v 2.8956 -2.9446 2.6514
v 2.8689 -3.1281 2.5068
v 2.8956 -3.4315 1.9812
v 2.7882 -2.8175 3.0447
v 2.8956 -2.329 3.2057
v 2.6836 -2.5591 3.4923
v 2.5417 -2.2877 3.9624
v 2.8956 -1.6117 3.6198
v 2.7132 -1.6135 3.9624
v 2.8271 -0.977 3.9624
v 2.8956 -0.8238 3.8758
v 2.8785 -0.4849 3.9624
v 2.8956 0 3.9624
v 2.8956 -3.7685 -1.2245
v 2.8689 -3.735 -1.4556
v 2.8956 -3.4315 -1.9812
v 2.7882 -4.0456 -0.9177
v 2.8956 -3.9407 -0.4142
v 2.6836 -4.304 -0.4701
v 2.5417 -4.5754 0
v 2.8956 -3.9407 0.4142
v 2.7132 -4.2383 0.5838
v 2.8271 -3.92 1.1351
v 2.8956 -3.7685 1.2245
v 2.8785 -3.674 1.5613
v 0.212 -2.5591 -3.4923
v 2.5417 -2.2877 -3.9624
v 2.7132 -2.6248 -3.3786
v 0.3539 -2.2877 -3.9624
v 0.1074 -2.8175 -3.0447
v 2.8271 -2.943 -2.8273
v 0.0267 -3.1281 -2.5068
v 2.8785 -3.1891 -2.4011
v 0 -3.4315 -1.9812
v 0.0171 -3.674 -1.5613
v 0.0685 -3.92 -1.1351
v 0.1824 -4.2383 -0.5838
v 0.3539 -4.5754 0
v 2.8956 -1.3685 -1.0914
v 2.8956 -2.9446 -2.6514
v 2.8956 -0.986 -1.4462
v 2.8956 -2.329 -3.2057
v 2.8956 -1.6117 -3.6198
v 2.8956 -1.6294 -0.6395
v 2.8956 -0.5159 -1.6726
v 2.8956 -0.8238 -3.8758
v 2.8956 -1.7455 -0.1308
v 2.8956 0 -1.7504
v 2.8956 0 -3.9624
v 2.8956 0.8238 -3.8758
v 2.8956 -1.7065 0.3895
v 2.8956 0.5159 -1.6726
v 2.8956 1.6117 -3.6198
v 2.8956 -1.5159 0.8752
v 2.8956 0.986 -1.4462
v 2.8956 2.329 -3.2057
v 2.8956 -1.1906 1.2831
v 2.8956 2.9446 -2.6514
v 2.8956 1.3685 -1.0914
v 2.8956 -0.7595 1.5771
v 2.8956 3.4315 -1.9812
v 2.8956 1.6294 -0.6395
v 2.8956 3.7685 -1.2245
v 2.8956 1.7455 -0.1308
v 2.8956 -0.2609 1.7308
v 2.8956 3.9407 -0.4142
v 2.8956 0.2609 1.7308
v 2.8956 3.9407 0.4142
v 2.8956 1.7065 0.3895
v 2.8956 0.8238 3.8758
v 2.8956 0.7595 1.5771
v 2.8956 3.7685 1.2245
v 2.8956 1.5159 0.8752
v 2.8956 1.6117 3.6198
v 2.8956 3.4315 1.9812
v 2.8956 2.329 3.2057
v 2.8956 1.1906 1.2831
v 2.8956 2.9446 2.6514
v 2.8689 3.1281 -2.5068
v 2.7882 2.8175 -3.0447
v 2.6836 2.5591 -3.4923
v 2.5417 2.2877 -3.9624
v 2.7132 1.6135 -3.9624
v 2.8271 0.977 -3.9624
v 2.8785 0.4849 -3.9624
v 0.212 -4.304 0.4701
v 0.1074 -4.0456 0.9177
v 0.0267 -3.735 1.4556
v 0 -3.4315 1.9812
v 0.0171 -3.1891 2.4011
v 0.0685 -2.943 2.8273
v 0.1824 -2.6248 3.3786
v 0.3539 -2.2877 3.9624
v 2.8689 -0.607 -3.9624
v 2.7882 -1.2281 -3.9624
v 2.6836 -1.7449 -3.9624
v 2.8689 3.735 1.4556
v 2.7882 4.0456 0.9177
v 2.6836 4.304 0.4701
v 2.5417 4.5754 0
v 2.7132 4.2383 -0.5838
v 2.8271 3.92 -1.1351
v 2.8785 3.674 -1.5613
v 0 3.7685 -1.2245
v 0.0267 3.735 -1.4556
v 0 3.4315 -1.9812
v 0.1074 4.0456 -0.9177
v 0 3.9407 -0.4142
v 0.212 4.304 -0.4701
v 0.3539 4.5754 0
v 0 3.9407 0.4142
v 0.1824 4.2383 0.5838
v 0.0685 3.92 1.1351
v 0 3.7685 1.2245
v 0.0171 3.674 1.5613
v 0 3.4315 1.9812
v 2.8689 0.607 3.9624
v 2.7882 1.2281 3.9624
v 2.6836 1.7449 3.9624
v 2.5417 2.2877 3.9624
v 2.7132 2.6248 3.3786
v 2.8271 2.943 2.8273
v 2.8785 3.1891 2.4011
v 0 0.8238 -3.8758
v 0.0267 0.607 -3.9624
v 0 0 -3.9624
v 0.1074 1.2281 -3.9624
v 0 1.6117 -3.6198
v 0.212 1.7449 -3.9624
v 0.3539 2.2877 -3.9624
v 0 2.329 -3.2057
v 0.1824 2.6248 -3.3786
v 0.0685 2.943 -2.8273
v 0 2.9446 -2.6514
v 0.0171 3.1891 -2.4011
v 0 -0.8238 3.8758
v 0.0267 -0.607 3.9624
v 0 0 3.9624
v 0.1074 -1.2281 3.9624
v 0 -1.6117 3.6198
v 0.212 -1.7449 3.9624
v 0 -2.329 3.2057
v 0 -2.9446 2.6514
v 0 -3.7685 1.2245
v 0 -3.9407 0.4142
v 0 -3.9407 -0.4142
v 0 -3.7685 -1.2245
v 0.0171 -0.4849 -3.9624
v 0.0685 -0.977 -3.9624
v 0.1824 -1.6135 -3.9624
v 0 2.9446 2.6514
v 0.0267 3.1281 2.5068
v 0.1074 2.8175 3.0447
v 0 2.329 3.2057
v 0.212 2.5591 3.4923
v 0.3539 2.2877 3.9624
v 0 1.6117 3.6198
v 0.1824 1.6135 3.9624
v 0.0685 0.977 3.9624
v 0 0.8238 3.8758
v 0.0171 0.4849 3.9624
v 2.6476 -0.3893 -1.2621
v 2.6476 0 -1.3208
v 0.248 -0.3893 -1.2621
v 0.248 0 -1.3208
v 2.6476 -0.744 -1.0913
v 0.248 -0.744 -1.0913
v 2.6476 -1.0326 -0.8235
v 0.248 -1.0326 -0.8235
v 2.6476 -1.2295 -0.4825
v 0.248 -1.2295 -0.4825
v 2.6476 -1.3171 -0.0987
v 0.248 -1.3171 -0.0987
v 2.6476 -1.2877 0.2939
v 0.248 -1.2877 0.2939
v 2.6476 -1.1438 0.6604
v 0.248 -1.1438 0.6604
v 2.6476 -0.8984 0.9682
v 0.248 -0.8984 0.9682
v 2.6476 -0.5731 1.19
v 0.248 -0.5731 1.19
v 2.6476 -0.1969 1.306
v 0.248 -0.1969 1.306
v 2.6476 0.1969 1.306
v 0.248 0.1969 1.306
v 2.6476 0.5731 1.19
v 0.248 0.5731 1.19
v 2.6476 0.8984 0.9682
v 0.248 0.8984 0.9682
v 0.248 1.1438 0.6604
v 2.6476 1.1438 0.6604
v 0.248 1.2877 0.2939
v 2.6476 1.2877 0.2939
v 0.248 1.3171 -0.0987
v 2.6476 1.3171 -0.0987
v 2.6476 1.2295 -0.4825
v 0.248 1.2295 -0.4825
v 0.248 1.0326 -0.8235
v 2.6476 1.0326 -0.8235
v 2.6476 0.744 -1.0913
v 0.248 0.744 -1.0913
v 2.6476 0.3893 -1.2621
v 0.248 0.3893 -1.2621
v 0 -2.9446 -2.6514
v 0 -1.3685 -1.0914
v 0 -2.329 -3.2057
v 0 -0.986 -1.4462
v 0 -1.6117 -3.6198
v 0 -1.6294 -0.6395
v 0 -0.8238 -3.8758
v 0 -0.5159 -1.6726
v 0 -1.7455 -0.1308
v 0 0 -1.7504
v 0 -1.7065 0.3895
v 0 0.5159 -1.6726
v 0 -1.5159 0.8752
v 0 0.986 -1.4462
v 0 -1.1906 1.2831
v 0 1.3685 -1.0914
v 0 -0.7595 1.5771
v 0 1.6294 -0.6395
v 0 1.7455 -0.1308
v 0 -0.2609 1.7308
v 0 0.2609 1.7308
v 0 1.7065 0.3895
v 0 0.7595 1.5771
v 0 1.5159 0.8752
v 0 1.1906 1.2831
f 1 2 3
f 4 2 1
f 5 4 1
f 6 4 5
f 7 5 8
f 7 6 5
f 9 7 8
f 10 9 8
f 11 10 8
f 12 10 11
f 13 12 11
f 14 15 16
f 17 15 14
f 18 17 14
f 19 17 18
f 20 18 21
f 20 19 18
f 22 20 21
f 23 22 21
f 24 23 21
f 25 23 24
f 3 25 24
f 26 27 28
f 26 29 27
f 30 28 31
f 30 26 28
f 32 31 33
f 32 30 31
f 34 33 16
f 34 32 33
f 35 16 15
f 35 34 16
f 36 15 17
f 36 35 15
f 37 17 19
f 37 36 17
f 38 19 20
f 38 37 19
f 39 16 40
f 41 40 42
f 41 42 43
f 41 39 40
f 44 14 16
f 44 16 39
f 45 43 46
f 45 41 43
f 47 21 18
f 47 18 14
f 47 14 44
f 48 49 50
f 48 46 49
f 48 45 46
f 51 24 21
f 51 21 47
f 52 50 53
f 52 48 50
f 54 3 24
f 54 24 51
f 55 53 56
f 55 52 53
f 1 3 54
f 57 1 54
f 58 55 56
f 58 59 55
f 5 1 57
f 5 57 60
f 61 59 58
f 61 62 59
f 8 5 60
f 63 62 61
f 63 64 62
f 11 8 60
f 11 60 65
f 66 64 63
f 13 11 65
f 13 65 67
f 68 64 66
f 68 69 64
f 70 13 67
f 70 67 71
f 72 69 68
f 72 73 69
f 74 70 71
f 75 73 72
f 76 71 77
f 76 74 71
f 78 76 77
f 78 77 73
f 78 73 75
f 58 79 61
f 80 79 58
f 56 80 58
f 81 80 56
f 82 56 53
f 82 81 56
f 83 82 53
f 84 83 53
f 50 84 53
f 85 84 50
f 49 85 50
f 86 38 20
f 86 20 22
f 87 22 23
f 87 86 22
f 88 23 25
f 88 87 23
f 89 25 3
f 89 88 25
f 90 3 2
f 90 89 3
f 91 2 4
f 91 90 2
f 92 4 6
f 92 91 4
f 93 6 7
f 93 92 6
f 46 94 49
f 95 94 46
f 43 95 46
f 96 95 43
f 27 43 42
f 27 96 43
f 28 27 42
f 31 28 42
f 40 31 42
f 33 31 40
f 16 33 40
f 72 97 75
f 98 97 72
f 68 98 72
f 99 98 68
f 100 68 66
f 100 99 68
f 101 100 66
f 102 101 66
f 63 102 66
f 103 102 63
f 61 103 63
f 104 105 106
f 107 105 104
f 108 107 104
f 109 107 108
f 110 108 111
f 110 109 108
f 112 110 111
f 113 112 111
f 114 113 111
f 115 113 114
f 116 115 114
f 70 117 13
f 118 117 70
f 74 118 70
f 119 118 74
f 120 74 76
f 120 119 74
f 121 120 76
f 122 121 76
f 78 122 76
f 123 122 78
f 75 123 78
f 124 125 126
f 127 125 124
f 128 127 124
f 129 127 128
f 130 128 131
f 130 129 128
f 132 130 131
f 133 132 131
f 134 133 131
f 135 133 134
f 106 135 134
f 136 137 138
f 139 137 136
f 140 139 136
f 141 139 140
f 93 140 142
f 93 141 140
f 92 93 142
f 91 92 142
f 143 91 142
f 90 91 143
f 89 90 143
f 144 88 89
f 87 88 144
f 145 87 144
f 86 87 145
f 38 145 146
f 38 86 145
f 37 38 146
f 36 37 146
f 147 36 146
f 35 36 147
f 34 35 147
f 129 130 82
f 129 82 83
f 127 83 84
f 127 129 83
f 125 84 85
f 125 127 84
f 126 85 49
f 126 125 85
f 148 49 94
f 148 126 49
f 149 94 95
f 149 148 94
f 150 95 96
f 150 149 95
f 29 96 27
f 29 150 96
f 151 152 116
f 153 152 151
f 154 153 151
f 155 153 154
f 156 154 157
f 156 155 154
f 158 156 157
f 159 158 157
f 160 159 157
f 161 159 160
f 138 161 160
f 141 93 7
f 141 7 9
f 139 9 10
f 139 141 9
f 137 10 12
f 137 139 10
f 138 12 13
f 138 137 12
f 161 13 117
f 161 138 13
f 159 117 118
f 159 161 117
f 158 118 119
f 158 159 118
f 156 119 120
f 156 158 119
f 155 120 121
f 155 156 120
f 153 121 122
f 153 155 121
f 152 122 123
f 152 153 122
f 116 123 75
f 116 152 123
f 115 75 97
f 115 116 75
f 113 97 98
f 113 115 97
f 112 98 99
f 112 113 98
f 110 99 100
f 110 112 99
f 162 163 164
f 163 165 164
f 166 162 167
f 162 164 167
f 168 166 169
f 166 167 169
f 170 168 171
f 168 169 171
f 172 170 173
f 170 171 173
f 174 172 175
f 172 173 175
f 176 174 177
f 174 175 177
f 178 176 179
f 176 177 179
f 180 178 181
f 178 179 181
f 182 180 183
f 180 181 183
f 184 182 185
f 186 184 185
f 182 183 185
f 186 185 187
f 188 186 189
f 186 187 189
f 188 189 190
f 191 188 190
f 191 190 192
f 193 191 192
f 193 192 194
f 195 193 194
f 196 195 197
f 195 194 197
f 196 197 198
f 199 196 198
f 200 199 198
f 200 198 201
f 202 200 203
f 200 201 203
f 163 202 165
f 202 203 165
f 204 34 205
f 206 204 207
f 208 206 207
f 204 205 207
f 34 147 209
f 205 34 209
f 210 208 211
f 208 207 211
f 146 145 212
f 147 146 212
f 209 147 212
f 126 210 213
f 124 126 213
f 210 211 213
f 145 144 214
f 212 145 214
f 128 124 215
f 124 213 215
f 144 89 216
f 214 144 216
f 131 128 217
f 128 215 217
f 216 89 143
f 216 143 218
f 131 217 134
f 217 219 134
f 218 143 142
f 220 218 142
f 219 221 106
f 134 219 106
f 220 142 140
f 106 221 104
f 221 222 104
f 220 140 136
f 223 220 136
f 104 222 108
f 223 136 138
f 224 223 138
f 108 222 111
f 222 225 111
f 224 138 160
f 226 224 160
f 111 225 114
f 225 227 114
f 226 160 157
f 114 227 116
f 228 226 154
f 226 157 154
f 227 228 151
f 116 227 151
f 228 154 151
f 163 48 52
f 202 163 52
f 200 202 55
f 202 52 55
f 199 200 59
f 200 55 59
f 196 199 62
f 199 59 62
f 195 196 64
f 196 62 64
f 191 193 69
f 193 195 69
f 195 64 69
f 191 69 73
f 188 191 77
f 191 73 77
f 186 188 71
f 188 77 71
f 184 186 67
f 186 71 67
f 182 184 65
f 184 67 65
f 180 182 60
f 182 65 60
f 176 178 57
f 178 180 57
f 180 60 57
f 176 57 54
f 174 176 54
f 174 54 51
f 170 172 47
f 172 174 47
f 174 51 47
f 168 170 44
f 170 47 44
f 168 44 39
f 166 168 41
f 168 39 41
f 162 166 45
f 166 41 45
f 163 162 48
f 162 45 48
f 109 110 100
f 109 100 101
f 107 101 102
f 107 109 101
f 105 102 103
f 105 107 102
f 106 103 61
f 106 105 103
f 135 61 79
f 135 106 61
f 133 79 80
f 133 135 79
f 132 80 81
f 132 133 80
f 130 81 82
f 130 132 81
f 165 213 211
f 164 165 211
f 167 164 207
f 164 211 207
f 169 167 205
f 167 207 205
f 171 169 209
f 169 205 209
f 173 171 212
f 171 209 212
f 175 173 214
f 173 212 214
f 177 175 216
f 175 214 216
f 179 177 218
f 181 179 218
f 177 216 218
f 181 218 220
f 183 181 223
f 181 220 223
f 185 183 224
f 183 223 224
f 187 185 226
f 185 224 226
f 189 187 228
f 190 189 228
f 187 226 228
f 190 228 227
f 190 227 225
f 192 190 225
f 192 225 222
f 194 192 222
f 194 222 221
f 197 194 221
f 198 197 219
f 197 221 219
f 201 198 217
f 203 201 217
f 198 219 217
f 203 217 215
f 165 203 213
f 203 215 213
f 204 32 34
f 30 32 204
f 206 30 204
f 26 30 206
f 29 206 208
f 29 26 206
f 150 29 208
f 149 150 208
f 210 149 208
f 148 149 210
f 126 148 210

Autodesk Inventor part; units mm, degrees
ref_plane "YZ Plane" through (0, 0, 0) normal (1, 0, 0) x (0, 1, 0)
ref_plane "XZ Plane" through (0, 0, 0) normal (0, 1, 0) x (-1, 0, 0)
sketch "Sketch1" plane through (0, 0, 0) normal (1, 0, 0) x (0, 1, 0)
  line L0 (-4.5754, 0) -> (-2.2877, 3.9624)
  line L1 (-2.2877, 3.9624) -> (2.2877, 3.9624)
  line L2 (2.2877, 3.9624) -> (4.5754, 0)
  line L3 (4.5754, 0) -> (2.2877, -3.9624)
  line L4 (2.2877, -3.9624) -> (-2.2877, -3.9624)
  line L5 (-2.2877, -3.9624) -> (-4.5754, 0)
  point P0 (0, 0)
  point P1 (0, 0)
  dimension "d0" = 9.1508
extrude "Body" add sketch "Sketch1" along normal blind 2.8956
sketch "Sketch2" plane through (0, 0, 0) normal (0, 0, 1) x (1, 0, 0)
  line L0 (0, 2.2877) -> (0, 4.5754) projected
  line L1 (0, 4.5754) -> (2.8956, 4.5754) projected
  line L2 (2.8956, 2.2877) -> (2.8956, 4.5754) projected
  line L3 (-0.5791, 0) -> (3.4747, 0) projected
  line L4 (0.3539, 4.5754) -> (0, 3.9624)
  line L5 (2.5417, 4.5754) -> (2.8956, 3.9624)
  dimension "d3" = 30
  dimension "d4" = 30
  dimension "d5" = 7.9248
  dimension "d6" = 7.9248
revolve "Chamfer1" cut sketch "Sketch2" angle 360 about axis through (-10, 0, 0) along (1, 0, 0)
sketch "Sketch3" plane through (2.8956, 0, 0) normal (1, 0, 0) x (0, 0, -1)
  arc A0 (-1.9812, -3.4315) -> (1.9812, -3.4315) centre (0, 0) ccw projected
hole "Thread" at (2.8956, 0, 0) direction (-1, 0, 0) diameter 2.6416 end through all thread size "6-32 UNC" class "2B" standard "ANSI Unified Screw Threads"
chamfer "Chamfer2" distance 0.4296 angle 30 1 edges at (2.8956, 0, 1.3208) measured on face at (2.8956, 3.0642, -0.0531)
chamfer "Chamfer3" distance 0.4296 angle 30 1 edges at (0, 0, 1.3208) measured on face at (0, -3.0642, -0.0531)
ref_plane "Work Plane1" through (-9.5512, 0, 0) normal (0, -0.866, -0.5) x (1, 0, 0)
equation "\"d0\" = 1.1547 * SW"
equation "\"d1\" = KOH"
equation "\"d3\" = ANG1"
equation "\"d4\" = ANG2"
equation "\"d5\" = SW0"
equation "\"d6\" = SW01"
equation "\"d8\" = -0.5 * GD1 + 0.5 * NND"
equation "\"d40\" = -0.5 * GD1 + 0.5 * NND"
equation "\"d10\" = -0.5 * GD1 + 0.5 * NND"
equation "\"d41\" = -0.5 * GD1 + 0.5 * NND"
equation "\"ANG1\" = 30deg"
equation "\"ANG2\" = 30deg"
equation "\"NND\" = 3.5052"
equation "\"KOH\" = 2.8956"
equation "\"SW\" = 7.9248"
equation "\"SW0\" = SW"
equation "\"SW01\" = SW"
equation "\"THREADDIA\" = 3.5052"
equation "\"TOA\" = 30deg"
equation "\"E0\" = 1.155 * SW"
equation "\"GD1\" = 2.64594"
properties part number "ANSI B18.2.2 - 6 - 32" material "Steel, Mild"
